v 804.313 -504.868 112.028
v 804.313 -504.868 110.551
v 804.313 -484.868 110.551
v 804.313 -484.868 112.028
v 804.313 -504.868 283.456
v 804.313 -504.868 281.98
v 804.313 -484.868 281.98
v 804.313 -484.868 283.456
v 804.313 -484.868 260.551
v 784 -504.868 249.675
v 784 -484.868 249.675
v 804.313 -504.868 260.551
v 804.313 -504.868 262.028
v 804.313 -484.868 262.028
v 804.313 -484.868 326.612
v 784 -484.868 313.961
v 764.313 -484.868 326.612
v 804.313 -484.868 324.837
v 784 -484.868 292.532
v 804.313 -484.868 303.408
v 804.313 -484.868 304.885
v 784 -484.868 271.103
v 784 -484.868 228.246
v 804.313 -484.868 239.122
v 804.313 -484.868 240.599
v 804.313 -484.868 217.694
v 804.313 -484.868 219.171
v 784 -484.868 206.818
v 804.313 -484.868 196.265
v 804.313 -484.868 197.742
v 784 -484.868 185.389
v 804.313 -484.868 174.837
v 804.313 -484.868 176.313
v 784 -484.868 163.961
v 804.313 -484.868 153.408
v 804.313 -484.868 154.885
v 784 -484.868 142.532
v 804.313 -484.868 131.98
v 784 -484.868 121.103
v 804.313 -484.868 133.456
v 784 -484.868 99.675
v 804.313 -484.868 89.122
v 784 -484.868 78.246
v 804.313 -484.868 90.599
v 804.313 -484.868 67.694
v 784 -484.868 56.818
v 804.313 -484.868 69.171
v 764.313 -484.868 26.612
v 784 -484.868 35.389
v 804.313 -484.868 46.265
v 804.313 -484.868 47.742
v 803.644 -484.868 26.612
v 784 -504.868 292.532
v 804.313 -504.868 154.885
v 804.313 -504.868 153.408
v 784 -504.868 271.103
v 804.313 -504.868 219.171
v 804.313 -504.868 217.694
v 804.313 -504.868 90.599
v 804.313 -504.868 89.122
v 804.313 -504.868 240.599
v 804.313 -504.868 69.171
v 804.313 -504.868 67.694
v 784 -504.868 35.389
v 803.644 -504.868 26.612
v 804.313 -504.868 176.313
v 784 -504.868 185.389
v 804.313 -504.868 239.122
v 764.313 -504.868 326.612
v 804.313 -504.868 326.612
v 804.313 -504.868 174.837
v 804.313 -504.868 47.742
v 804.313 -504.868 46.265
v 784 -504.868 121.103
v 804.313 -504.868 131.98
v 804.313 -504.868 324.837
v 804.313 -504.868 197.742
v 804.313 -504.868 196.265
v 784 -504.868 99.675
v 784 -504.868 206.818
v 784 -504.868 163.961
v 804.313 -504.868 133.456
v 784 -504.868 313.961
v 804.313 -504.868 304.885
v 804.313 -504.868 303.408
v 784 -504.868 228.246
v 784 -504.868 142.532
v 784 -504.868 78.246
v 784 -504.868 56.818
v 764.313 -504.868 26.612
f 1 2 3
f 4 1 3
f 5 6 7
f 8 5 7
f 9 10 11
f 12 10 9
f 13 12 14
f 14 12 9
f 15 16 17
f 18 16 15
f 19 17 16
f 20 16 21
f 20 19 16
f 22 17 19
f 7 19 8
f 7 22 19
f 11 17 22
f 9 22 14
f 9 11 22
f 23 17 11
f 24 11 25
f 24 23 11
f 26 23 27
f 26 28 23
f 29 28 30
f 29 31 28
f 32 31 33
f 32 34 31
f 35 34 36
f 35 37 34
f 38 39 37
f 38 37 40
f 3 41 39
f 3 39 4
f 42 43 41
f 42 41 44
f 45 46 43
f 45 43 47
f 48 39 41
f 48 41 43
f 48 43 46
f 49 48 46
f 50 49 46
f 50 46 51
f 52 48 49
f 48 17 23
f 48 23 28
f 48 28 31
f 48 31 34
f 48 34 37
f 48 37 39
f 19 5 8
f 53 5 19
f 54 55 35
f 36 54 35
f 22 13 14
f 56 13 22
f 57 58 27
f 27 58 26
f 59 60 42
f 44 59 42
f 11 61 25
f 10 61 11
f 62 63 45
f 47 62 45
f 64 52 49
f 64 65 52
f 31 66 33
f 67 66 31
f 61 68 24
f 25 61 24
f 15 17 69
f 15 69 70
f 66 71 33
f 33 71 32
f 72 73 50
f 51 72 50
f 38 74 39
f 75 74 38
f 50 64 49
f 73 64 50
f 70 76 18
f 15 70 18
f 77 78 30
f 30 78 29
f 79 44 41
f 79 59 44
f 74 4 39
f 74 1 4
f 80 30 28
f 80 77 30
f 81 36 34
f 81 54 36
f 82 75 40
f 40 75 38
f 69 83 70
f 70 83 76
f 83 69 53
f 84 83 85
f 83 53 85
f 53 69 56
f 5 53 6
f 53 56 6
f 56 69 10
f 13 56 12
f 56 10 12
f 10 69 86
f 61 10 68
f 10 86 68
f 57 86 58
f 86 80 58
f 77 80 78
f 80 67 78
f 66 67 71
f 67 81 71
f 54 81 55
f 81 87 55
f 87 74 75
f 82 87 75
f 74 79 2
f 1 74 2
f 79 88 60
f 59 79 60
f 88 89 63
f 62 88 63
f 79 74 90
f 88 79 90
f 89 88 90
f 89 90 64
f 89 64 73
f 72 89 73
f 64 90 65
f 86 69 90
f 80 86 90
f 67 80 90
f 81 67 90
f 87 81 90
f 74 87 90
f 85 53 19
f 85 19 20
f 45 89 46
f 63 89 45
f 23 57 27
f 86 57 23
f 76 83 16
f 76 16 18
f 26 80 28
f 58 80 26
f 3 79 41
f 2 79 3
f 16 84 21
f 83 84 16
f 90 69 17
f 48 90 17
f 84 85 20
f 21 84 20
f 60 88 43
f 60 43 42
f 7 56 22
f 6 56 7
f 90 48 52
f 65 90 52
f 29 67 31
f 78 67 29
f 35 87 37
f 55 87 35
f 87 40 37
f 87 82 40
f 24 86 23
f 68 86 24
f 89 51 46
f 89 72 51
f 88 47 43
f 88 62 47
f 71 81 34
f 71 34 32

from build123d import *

# Parameters (mm, degrees)
SKETCH_W            = 40
SKETCH_H            = 20
PAD_DEPTH           = 300
POCKET_DEPTH        = 12
LINEARPATTERN_COUNT = 15
LINEARPATTERN_PITCH = 21.428571


with BuildPart() as part:
    # Sketch → Pad (new body)
    with BuildSketch(Plane.XY.offset(26.612171)):
        with Locations((0.312673, 1.131631)):
            Rectangle(SKETCH_W, SKETCH_H)
    extrude(amount=PAD_DEPTH)

    # Sketch001 → Pocket (cut, symmetric)
    with BuildSketch(Plane.XZ):
        Polygon((21.003967, 325.206817), (21.003967, 304.575988), (0, 313.960541), align=None)
    pocket = extrude(amount=POCKET_DEPTH, both=True, mode=Mode.SUBTRACT)

    # LinearPattern: Pocket ×15
    with Locations(*[(0, 0, -i * LINEARPATTERN_PITCH) for i in range(1, LINEARPATTERN_COUNT)]):
        add(pocket, mode=Mode.SUBTRACT)


with BuildPart() as part_1:
    # Body placement: moved
    add(part.part.moved(Location((784, -496, 0))))


solid = part_1.part
